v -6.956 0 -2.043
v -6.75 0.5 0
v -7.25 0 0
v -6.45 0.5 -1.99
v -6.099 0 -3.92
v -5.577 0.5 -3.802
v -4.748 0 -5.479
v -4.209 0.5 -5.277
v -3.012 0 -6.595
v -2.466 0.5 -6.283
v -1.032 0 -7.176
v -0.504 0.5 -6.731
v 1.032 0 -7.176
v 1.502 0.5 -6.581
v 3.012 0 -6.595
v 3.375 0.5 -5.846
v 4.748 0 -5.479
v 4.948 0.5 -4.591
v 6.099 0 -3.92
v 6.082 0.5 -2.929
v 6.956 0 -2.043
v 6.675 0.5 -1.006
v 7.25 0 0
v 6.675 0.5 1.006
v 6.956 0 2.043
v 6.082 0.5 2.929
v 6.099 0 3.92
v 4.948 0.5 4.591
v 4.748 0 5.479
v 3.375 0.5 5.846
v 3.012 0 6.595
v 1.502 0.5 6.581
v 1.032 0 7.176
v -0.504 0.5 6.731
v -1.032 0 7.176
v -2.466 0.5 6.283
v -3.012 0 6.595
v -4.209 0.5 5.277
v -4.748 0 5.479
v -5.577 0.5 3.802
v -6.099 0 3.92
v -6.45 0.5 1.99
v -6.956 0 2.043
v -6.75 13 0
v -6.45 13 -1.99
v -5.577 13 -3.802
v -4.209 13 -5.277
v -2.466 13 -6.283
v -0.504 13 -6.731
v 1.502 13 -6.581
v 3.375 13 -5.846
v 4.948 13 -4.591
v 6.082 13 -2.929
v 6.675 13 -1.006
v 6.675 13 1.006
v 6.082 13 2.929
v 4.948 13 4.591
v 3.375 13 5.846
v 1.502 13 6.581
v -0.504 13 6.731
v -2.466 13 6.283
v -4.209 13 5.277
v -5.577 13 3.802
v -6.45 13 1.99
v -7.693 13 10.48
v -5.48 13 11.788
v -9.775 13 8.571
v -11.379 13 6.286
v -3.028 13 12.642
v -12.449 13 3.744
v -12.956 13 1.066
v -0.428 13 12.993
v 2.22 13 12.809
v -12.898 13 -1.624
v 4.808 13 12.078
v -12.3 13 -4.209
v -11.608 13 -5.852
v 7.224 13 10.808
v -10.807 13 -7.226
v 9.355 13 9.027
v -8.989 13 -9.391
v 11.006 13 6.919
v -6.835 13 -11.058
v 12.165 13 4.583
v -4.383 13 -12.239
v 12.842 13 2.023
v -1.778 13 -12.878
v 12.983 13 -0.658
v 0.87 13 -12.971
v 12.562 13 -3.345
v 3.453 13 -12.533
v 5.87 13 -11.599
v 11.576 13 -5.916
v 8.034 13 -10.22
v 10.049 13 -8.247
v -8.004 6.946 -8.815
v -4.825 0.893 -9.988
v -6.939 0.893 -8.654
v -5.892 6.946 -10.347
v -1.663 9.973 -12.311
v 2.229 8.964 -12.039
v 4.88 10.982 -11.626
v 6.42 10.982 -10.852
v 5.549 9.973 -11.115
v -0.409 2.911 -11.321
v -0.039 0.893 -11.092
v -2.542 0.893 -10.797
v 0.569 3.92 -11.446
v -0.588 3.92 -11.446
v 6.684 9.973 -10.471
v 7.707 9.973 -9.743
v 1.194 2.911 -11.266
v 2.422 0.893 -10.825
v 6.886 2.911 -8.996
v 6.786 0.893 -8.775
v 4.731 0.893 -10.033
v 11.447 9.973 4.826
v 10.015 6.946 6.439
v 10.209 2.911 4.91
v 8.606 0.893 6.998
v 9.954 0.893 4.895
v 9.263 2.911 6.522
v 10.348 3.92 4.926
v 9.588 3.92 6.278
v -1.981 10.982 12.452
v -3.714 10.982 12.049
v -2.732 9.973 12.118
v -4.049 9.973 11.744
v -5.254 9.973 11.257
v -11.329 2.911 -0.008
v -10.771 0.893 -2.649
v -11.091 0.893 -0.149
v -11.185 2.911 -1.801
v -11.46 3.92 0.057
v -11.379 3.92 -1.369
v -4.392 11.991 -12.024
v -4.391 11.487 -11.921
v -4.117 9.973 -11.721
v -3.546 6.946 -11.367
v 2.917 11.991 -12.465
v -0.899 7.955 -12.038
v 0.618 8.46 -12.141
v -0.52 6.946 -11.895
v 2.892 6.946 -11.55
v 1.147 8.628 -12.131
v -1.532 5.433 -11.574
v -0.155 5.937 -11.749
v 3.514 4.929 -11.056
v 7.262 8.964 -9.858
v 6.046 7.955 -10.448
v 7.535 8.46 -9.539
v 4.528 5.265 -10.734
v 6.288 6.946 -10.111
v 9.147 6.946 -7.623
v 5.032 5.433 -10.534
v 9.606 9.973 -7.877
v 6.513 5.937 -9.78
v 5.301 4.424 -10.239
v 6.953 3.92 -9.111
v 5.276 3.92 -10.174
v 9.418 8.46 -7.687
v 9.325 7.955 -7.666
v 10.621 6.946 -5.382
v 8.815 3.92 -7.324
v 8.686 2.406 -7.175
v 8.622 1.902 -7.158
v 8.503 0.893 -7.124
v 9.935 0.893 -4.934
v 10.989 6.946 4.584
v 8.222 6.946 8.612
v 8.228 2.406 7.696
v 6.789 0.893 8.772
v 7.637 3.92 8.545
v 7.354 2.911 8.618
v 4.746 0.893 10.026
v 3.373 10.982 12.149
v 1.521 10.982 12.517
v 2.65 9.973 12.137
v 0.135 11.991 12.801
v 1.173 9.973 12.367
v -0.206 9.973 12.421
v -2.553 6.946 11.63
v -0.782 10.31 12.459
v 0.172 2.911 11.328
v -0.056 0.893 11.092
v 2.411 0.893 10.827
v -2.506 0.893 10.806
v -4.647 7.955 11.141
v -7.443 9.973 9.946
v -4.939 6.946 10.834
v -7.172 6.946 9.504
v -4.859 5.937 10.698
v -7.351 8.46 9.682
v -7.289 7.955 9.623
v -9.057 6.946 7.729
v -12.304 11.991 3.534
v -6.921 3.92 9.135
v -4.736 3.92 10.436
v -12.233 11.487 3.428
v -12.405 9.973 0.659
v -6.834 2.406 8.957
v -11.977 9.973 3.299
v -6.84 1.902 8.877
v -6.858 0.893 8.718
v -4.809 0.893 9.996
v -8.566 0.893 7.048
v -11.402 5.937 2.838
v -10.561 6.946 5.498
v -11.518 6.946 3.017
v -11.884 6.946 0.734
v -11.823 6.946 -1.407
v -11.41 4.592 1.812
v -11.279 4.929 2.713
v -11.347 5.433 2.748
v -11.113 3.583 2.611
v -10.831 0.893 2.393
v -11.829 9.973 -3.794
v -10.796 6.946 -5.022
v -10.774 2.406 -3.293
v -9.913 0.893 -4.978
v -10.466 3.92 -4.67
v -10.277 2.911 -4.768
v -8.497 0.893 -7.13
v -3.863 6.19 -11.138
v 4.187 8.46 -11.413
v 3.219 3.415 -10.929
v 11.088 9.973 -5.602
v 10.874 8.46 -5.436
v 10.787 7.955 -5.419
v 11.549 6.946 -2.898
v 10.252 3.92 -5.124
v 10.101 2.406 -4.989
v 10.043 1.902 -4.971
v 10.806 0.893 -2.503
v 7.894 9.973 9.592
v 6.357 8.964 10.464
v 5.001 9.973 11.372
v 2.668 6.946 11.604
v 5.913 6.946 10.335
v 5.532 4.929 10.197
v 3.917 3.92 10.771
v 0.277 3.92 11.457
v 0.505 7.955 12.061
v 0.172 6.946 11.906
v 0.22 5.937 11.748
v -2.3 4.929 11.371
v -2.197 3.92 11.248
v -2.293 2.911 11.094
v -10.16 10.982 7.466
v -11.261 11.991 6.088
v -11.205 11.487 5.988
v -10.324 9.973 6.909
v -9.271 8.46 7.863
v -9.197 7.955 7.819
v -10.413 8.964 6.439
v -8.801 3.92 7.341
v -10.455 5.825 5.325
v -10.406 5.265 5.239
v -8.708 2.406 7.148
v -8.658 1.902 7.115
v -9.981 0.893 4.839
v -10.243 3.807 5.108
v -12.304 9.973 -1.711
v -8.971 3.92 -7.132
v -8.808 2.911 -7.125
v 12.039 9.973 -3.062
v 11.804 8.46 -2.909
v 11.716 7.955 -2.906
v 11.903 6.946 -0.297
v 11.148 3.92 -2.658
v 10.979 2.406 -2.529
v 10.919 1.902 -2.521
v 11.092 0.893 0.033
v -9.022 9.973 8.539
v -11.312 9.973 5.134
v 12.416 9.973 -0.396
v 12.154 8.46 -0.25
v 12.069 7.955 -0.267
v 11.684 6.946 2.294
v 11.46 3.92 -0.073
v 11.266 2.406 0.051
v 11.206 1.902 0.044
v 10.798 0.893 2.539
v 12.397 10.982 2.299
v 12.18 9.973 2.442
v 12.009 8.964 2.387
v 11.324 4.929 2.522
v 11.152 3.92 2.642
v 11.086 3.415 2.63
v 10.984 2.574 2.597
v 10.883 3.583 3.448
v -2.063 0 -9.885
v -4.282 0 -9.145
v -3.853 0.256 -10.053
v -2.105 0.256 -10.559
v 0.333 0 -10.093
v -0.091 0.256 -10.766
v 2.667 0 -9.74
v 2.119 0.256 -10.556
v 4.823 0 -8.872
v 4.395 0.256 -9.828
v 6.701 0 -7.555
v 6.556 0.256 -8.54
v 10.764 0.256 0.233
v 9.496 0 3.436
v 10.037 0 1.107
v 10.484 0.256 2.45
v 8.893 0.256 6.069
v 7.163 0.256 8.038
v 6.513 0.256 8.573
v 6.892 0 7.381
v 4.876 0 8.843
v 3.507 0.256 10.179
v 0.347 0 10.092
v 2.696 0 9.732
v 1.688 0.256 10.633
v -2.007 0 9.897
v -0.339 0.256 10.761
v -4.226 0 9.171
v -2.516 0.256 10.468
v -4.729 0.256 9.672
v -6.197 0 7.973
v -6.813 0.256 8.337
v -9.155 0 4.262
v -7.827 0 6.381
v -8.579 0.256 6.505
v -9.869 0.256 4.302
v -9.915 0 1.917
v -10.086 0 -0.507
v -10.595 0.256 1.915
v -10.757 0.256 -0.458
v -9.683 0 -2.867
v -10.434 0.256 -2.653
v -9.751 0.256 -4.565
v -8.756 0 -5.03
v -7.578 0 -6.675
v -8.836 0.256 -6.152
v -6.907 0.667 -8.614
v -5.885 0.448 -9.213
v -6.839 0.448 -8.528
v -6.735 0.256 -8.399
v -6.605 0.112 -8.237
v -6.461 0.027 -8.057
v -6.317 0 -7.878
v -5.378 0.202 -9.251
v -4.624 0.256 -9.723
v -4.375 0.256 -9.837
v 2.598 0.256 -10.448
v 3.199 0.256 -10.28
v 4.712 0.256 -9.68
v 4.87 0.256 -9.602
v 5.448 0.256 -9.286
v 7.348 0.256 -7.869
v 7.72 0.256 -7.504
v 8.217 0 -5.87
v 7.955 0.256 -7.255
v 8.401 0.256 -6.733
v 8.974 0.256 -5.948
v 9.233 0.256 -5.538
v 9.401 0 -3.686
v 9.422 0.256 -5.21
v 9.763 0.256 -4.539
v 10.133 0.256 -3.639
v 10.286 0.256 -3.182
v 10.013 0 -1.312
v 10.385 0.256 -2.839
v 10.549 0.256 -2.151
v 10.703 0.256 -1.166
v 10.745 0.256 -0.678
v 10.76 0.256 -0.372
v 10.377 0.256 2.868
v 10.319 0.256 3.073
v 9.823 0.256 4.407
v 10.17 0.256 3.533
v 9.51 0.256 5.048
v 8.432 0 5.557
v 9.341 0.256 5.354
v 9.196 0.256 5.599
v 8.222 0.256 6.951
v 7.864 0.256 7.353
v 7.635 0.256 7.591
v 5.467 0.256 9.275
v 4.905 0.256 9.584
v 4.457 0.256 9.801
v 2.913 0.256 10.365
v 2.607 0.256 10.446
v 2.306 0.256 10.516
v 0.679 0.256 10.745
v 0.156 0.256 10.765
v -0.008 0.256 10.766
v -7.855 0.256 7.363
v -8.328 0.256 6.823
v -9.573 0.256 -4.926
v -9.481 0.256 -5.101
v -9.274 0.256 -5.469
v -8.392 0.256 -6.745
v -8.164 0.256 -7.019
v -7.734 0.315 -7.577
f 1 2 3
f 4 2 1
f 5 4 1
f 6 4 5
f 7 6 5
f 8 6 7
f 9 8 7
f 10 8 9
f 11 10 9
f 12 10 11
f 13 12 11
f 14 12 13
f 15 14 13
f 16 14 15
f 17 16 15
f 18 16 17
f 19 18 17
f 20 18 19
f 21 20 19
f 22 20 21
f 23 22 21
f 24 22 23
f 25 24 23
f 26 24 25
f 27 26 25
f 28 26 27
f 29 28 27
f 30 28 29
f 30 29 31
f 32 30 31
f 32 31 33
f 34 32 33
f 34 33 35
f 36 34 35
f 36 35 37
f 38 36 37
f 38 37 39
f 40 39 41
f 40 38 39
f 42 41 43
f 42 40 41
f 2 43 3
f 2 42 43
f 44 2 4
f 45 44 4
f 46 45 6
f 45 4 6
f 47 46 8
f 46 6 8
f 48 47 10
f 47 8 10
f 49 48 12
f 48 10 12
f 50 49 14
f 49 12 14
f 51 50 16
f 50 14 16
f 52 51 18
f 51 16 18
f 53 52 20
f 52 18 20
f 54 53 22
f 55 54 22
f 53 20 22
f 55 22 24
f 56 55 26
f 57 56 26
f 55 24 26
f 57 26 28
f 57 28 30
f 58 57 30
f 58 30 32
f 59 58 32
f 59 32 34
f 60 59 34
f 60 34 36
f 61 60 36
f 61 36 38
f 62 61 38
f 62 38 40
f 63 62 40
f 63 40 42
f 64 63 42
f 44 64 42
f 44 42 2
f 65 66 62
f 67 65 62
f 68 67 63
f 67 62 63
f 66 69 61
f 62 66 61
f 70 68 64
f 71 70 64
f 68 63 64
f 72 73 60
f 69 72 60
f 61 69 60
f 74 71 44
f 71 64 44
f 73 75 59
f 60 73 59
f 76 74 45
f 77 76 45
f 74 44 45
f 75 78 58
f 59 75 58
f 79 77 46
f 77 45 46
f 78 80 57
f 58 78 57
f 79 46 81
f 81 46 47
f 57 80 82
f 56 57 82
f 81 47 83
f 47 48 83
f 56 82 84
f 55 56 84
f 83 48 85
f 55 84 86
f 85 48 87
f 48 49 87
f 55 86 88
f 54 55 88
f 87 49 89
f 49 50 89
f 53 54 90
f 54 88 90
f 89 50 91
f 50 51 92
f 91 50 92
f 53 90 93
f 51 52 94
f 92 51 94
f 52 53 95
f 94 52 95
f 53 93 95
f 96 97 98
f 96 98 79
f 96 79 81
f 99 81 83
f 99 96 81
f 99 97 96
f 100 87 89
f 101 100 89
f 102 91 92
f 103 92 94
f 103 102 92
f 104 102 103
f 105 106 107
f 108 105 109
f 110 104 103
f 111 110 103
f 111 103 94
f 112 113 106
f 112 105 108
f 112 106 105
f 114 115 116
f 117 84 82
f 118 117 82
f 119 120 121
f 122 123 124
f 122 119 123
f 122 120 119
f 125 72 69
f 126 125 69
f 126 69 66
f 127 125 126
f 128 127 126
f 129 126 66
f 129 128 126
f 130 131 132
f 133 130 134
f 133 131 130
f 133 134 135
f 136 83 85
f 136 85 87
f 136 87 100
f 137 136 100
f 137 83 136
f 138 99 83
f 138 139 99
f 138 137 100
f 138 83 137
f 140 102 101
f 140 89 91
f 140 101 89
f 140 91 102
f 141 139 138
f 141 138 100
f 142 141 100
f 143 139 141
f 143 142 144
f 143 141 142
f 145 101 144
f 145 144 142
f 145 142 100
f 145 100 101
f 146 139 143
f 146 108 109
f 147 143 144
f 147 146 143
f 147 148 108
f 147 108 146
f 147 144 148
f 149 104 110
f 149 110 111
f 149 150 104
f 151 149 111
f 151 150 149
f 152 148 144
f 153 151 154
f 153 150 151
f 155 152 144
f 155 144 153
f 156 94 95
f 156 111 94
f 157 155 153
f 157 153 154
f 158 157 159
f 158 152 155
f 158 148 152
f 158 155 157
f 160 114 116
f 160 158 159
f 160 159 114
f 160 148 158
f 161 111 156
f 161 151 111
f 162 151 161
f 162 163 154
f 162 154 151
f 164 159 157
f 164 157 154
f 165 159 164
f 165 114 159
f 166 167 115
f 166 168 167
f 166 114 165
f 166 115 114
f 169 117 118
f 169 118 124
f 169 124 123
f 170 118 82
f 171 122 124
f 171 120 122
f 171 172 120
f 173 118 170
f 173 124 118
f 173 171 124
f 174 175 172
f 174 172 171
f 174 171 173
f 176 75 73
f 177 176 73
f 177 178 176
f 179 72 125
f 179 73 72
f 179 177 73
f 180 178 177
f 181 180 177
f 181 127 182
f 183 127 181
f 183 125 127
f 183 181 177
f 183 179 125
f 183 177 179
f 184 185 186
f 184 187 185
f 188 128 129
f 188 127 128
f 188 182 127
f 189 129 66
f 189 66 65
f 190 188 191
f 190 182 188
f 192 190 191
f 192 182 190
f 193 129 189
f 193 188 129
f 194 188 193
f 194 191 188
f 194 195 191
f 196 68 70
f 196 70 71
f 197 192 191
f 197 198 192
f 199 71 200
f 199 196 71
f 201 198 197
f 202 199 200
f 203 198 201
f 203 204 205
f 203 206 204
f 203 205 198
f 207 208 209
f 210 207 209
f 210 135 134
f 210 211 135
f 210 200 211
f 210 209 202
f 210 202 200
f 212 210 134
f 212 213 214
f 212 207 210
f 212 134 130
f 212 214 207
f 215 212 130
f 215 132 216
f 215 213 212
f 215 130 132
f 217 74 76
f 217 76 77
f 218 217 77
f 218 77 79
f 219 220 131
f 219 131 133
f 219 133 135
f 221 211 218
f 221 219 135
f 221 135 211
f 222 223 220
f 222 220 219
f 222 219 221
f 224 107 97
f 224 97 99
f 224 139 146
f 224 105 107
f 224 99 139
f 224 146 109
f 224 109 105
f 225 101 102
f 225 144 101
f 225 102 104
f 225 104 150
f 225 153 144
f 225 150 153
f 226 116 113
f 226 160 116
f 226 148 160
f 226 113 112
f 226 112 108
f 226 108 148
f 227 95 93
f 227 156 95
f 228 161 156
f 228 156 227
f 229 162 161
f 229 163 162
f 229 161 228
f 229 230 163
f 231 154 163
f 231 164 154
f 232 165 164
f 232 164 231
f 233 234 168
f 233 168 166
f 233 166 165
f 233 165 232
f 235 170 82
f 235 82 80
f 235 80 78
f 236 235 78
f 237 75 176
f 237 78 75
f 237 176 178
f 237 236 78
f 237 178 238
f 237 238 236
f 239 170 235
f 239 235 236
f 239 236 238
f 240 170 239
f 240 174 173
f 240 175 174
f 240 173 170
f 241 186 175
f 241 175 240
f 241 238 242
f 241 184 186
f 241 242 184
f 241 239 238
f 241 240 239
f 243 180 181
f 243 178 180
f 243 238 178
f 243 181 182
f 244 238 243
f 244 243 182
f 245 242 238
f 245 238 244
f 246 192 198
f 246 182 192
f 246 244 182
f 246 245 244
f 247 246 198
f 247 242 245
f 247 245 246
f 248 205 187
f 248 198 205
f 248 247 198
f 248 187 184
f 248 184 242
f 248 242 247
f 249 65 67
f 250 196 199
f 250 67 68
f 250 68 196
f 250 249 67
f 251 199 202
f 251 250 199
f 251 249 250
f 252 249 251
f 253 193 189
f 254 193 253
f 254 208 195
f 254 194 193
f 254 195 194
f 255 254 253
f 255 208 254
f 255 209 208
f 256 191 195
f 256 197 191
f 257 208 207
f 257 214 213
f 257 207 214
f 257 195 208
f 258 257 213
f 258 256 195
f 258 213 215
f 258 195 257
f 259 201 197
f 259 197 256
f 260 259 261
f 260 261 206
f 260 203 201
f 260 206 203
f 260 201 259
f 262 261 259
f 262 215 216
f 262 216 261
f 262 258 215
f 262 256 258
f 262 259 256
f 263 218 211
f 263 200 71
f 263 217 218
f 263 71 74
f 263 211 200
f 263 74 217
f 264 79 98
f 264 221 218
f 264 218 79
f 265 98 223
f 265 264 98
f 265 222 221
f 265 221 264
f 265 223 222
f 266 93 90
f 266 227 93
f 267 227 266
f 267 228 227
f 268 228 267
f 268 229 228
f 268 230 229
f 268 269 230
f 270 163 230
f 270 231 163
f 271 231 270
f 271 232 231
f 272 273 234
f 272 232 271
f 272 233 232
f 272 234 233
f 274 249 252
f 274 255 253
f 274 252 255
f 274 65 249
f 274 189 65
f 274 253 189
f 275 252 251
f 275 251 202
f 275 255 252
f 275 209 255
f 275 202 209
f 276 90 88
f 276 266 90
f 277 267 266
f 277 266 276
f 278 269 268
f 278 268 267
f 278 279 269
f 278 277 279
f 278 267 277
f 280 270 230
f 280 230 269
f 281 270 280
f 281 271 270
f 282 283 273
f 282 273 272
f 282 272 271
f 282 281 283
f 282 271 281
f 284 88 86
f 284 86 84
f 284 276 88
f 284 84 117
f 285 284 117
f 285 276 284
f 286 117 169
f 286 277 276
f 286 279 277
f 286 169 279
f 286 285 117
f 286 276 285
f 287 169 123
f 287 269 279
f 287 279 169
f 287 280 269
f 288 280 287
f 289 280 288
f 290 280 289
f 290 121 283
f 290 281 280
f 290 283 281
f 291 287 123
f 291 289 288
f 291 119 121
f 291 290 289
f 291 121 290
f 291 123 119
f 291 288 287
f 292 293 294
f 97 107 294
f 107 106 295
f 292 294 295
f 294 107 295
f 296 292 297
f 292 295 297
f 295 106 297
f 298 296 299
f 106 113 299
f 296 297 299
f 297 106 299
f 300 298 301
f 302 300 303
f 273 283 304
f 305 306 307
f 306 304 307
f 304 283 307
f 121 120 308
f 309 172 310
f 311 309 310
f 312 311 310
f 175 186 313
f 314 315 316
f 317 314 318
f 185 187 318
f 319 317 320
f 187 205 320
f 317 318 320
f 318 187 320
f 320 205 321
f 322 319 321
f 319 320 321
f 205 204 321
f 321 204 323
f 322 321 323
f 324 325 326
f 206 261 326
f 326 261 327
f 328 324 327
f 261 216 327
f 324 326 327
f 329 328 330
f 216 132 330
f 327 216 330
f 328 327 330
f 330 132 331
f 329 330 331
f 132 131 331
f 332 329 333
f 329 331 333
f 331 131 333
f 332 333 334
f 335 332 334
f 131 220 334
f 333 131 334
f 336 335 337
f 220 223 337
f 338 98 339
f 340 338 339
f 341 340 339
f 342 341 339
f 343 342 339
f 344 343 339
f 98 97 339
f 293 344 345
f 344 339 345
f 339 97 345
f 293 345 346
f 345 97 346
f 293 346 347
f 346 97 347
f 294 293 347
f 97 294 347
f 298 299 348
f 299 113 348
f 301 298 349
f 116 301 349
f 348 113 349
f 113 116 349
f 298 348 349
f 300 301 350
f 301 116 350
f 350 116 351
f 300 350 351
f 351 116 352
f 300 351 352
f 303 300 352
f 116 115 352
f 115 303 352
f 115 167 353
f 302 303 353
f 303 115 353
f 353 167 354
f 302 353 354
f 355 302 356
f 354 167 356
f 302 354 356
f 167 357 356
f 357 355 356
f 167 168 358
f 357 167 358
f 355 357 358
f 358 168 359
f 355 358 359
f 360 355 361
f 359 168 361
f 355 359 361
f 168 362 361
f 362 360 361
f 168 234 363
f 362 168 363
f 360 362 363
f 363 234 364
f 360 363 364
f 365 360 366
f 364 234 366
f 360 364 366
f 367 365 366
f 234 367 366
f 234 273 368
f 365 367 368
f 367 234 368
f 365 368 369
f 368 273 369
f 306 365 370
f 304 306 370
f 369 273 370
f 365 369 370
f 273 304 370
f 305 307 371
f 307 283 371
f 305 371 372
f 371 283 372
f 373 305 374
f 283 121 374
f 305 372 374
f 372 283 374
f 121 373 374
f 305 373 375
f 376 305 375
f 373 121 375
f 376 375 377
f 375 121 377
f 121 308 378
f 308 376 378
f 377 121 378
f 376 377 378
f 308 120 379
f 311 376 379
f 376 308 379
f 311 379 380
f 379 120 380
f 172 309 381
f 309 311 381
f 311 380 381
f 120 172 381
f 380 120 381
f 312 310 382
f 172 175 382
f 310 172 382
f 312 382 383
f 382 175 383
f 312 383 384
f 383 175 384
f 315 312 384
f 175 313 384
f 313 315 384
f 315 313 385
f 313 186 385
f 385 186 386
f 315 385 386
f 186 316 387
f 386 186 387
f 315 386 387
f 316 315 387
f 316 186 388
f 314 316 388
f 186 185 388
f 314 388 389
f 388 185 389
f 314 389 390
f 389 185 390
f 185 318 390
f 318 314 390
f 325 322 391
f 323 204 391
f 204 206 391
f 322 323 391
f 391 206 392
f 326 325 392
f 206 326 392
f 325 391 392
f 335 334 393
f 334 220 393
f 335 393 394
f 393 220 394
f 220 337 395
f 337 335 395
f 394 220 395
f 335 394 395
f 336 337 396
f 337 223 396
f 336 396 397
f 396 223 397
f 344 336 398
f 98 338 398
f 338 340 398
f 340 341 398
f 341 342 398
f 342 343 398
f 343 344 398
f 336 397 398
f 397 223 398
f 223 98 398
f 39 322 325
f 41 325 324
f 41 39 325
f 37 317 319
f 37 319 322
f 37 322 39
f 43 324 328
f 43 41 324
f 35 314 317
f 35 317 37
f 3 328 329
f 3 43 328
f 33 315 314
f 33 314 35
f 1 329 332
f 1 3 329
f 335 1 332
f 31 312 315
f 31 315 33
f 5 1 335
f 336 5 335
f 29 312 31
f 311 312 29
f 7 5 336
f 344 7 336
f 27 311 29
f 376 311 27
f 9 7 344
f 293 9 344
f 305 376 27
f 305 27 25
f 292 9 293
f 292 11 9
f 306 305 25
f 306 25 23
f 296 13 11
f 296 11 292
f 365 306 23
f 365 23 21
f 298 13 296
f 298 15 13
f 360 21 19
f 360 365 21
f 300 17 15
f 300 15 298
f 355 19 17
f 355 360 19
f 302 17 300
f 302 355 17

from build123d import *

# Parameters (mm, degrees)
CONG_1_R          = 1
D_GAGEMENT_M121_D = 13.5
CHANFREIN1_SIZE   = 0.5


with BuildPart() as part:
    # Lissage1: read off the stored shape, not the designer's step
    # Lissage1: loft between two sections, ruled curve by curve
    lissage1_from = [
        Edge.make_bspline([(-10.806835439, 13, -7.225808453), (3.644781468, 13, -28.83947933), (25.258452345, 13, -14.387862424), (10.806835439, 13, 7.225808453), (-3.644781468, 13, 28.83947933), (-25.258452345, 13, 14.387862424), (-10.806835439, 13, -7.225808453)], [0, 0, 0, 0, 0.5, 0.5, 0.5, 1, 1, 1, 1], 3, [1, 0.333333333, 0.333333333, 1, 0.333333333, 0.333333333, 1]),
    ]
    lissage1_to = [
        Edge.make_bspline([(-6.654259826, 0, -8.759042537), (10.863825248, 0, -22.06756219), (24.1723449, 0, -4.549477116), (6.654259826, 0, 8.759042537), (-10.863825248, 0, 22.06756219), (-24.1723449, 0, 4.549477116), (-6.654259826, 0, -8.759042537)], [0, 0, 0, 0, 0.5, 0.5, 0.5, 1, 1, 1, 1], 3, [1, 0.333333333, 0.333333333, 1, 0.333333333, 0.333333333, 1]),
    ]
    lissage1 = Solid(Shell([*[Face.make_surface_from_curves(lissage1_from[k], lissage1_to[k]) for k in range(1)], Face(Wire(lissage1_from)), Face(Wire(lissage1_to))]))
    add(lissage1)

    # Congé1
    cong_1_edges = [part.edges().sort_by_distance(p)[0] for p in [
        (6.654259826, 0, 8.759042537),
    ]]
    fillet(cong_1_edges, radius=CONG_1_R)

    # Dégagement M121 (through all)
    with Locations(Plane(origin=(0, 13, 0), x_dir=(1, 0, 0), z_dir=(0, 1, 0))):
        with Locations((0, 0)):
            Hole(D_GAGEMENT_M121_D / 2)

    # Chanfrein1
    chanfrein1_edges = [part.edges().sort_by_distance(p)[0] for p in [
        (6.75, 0, 0),
    ]]
    chamfer(chanfrein1_edges, length=CHANFREIN1_SIZE)


solid = part.part
